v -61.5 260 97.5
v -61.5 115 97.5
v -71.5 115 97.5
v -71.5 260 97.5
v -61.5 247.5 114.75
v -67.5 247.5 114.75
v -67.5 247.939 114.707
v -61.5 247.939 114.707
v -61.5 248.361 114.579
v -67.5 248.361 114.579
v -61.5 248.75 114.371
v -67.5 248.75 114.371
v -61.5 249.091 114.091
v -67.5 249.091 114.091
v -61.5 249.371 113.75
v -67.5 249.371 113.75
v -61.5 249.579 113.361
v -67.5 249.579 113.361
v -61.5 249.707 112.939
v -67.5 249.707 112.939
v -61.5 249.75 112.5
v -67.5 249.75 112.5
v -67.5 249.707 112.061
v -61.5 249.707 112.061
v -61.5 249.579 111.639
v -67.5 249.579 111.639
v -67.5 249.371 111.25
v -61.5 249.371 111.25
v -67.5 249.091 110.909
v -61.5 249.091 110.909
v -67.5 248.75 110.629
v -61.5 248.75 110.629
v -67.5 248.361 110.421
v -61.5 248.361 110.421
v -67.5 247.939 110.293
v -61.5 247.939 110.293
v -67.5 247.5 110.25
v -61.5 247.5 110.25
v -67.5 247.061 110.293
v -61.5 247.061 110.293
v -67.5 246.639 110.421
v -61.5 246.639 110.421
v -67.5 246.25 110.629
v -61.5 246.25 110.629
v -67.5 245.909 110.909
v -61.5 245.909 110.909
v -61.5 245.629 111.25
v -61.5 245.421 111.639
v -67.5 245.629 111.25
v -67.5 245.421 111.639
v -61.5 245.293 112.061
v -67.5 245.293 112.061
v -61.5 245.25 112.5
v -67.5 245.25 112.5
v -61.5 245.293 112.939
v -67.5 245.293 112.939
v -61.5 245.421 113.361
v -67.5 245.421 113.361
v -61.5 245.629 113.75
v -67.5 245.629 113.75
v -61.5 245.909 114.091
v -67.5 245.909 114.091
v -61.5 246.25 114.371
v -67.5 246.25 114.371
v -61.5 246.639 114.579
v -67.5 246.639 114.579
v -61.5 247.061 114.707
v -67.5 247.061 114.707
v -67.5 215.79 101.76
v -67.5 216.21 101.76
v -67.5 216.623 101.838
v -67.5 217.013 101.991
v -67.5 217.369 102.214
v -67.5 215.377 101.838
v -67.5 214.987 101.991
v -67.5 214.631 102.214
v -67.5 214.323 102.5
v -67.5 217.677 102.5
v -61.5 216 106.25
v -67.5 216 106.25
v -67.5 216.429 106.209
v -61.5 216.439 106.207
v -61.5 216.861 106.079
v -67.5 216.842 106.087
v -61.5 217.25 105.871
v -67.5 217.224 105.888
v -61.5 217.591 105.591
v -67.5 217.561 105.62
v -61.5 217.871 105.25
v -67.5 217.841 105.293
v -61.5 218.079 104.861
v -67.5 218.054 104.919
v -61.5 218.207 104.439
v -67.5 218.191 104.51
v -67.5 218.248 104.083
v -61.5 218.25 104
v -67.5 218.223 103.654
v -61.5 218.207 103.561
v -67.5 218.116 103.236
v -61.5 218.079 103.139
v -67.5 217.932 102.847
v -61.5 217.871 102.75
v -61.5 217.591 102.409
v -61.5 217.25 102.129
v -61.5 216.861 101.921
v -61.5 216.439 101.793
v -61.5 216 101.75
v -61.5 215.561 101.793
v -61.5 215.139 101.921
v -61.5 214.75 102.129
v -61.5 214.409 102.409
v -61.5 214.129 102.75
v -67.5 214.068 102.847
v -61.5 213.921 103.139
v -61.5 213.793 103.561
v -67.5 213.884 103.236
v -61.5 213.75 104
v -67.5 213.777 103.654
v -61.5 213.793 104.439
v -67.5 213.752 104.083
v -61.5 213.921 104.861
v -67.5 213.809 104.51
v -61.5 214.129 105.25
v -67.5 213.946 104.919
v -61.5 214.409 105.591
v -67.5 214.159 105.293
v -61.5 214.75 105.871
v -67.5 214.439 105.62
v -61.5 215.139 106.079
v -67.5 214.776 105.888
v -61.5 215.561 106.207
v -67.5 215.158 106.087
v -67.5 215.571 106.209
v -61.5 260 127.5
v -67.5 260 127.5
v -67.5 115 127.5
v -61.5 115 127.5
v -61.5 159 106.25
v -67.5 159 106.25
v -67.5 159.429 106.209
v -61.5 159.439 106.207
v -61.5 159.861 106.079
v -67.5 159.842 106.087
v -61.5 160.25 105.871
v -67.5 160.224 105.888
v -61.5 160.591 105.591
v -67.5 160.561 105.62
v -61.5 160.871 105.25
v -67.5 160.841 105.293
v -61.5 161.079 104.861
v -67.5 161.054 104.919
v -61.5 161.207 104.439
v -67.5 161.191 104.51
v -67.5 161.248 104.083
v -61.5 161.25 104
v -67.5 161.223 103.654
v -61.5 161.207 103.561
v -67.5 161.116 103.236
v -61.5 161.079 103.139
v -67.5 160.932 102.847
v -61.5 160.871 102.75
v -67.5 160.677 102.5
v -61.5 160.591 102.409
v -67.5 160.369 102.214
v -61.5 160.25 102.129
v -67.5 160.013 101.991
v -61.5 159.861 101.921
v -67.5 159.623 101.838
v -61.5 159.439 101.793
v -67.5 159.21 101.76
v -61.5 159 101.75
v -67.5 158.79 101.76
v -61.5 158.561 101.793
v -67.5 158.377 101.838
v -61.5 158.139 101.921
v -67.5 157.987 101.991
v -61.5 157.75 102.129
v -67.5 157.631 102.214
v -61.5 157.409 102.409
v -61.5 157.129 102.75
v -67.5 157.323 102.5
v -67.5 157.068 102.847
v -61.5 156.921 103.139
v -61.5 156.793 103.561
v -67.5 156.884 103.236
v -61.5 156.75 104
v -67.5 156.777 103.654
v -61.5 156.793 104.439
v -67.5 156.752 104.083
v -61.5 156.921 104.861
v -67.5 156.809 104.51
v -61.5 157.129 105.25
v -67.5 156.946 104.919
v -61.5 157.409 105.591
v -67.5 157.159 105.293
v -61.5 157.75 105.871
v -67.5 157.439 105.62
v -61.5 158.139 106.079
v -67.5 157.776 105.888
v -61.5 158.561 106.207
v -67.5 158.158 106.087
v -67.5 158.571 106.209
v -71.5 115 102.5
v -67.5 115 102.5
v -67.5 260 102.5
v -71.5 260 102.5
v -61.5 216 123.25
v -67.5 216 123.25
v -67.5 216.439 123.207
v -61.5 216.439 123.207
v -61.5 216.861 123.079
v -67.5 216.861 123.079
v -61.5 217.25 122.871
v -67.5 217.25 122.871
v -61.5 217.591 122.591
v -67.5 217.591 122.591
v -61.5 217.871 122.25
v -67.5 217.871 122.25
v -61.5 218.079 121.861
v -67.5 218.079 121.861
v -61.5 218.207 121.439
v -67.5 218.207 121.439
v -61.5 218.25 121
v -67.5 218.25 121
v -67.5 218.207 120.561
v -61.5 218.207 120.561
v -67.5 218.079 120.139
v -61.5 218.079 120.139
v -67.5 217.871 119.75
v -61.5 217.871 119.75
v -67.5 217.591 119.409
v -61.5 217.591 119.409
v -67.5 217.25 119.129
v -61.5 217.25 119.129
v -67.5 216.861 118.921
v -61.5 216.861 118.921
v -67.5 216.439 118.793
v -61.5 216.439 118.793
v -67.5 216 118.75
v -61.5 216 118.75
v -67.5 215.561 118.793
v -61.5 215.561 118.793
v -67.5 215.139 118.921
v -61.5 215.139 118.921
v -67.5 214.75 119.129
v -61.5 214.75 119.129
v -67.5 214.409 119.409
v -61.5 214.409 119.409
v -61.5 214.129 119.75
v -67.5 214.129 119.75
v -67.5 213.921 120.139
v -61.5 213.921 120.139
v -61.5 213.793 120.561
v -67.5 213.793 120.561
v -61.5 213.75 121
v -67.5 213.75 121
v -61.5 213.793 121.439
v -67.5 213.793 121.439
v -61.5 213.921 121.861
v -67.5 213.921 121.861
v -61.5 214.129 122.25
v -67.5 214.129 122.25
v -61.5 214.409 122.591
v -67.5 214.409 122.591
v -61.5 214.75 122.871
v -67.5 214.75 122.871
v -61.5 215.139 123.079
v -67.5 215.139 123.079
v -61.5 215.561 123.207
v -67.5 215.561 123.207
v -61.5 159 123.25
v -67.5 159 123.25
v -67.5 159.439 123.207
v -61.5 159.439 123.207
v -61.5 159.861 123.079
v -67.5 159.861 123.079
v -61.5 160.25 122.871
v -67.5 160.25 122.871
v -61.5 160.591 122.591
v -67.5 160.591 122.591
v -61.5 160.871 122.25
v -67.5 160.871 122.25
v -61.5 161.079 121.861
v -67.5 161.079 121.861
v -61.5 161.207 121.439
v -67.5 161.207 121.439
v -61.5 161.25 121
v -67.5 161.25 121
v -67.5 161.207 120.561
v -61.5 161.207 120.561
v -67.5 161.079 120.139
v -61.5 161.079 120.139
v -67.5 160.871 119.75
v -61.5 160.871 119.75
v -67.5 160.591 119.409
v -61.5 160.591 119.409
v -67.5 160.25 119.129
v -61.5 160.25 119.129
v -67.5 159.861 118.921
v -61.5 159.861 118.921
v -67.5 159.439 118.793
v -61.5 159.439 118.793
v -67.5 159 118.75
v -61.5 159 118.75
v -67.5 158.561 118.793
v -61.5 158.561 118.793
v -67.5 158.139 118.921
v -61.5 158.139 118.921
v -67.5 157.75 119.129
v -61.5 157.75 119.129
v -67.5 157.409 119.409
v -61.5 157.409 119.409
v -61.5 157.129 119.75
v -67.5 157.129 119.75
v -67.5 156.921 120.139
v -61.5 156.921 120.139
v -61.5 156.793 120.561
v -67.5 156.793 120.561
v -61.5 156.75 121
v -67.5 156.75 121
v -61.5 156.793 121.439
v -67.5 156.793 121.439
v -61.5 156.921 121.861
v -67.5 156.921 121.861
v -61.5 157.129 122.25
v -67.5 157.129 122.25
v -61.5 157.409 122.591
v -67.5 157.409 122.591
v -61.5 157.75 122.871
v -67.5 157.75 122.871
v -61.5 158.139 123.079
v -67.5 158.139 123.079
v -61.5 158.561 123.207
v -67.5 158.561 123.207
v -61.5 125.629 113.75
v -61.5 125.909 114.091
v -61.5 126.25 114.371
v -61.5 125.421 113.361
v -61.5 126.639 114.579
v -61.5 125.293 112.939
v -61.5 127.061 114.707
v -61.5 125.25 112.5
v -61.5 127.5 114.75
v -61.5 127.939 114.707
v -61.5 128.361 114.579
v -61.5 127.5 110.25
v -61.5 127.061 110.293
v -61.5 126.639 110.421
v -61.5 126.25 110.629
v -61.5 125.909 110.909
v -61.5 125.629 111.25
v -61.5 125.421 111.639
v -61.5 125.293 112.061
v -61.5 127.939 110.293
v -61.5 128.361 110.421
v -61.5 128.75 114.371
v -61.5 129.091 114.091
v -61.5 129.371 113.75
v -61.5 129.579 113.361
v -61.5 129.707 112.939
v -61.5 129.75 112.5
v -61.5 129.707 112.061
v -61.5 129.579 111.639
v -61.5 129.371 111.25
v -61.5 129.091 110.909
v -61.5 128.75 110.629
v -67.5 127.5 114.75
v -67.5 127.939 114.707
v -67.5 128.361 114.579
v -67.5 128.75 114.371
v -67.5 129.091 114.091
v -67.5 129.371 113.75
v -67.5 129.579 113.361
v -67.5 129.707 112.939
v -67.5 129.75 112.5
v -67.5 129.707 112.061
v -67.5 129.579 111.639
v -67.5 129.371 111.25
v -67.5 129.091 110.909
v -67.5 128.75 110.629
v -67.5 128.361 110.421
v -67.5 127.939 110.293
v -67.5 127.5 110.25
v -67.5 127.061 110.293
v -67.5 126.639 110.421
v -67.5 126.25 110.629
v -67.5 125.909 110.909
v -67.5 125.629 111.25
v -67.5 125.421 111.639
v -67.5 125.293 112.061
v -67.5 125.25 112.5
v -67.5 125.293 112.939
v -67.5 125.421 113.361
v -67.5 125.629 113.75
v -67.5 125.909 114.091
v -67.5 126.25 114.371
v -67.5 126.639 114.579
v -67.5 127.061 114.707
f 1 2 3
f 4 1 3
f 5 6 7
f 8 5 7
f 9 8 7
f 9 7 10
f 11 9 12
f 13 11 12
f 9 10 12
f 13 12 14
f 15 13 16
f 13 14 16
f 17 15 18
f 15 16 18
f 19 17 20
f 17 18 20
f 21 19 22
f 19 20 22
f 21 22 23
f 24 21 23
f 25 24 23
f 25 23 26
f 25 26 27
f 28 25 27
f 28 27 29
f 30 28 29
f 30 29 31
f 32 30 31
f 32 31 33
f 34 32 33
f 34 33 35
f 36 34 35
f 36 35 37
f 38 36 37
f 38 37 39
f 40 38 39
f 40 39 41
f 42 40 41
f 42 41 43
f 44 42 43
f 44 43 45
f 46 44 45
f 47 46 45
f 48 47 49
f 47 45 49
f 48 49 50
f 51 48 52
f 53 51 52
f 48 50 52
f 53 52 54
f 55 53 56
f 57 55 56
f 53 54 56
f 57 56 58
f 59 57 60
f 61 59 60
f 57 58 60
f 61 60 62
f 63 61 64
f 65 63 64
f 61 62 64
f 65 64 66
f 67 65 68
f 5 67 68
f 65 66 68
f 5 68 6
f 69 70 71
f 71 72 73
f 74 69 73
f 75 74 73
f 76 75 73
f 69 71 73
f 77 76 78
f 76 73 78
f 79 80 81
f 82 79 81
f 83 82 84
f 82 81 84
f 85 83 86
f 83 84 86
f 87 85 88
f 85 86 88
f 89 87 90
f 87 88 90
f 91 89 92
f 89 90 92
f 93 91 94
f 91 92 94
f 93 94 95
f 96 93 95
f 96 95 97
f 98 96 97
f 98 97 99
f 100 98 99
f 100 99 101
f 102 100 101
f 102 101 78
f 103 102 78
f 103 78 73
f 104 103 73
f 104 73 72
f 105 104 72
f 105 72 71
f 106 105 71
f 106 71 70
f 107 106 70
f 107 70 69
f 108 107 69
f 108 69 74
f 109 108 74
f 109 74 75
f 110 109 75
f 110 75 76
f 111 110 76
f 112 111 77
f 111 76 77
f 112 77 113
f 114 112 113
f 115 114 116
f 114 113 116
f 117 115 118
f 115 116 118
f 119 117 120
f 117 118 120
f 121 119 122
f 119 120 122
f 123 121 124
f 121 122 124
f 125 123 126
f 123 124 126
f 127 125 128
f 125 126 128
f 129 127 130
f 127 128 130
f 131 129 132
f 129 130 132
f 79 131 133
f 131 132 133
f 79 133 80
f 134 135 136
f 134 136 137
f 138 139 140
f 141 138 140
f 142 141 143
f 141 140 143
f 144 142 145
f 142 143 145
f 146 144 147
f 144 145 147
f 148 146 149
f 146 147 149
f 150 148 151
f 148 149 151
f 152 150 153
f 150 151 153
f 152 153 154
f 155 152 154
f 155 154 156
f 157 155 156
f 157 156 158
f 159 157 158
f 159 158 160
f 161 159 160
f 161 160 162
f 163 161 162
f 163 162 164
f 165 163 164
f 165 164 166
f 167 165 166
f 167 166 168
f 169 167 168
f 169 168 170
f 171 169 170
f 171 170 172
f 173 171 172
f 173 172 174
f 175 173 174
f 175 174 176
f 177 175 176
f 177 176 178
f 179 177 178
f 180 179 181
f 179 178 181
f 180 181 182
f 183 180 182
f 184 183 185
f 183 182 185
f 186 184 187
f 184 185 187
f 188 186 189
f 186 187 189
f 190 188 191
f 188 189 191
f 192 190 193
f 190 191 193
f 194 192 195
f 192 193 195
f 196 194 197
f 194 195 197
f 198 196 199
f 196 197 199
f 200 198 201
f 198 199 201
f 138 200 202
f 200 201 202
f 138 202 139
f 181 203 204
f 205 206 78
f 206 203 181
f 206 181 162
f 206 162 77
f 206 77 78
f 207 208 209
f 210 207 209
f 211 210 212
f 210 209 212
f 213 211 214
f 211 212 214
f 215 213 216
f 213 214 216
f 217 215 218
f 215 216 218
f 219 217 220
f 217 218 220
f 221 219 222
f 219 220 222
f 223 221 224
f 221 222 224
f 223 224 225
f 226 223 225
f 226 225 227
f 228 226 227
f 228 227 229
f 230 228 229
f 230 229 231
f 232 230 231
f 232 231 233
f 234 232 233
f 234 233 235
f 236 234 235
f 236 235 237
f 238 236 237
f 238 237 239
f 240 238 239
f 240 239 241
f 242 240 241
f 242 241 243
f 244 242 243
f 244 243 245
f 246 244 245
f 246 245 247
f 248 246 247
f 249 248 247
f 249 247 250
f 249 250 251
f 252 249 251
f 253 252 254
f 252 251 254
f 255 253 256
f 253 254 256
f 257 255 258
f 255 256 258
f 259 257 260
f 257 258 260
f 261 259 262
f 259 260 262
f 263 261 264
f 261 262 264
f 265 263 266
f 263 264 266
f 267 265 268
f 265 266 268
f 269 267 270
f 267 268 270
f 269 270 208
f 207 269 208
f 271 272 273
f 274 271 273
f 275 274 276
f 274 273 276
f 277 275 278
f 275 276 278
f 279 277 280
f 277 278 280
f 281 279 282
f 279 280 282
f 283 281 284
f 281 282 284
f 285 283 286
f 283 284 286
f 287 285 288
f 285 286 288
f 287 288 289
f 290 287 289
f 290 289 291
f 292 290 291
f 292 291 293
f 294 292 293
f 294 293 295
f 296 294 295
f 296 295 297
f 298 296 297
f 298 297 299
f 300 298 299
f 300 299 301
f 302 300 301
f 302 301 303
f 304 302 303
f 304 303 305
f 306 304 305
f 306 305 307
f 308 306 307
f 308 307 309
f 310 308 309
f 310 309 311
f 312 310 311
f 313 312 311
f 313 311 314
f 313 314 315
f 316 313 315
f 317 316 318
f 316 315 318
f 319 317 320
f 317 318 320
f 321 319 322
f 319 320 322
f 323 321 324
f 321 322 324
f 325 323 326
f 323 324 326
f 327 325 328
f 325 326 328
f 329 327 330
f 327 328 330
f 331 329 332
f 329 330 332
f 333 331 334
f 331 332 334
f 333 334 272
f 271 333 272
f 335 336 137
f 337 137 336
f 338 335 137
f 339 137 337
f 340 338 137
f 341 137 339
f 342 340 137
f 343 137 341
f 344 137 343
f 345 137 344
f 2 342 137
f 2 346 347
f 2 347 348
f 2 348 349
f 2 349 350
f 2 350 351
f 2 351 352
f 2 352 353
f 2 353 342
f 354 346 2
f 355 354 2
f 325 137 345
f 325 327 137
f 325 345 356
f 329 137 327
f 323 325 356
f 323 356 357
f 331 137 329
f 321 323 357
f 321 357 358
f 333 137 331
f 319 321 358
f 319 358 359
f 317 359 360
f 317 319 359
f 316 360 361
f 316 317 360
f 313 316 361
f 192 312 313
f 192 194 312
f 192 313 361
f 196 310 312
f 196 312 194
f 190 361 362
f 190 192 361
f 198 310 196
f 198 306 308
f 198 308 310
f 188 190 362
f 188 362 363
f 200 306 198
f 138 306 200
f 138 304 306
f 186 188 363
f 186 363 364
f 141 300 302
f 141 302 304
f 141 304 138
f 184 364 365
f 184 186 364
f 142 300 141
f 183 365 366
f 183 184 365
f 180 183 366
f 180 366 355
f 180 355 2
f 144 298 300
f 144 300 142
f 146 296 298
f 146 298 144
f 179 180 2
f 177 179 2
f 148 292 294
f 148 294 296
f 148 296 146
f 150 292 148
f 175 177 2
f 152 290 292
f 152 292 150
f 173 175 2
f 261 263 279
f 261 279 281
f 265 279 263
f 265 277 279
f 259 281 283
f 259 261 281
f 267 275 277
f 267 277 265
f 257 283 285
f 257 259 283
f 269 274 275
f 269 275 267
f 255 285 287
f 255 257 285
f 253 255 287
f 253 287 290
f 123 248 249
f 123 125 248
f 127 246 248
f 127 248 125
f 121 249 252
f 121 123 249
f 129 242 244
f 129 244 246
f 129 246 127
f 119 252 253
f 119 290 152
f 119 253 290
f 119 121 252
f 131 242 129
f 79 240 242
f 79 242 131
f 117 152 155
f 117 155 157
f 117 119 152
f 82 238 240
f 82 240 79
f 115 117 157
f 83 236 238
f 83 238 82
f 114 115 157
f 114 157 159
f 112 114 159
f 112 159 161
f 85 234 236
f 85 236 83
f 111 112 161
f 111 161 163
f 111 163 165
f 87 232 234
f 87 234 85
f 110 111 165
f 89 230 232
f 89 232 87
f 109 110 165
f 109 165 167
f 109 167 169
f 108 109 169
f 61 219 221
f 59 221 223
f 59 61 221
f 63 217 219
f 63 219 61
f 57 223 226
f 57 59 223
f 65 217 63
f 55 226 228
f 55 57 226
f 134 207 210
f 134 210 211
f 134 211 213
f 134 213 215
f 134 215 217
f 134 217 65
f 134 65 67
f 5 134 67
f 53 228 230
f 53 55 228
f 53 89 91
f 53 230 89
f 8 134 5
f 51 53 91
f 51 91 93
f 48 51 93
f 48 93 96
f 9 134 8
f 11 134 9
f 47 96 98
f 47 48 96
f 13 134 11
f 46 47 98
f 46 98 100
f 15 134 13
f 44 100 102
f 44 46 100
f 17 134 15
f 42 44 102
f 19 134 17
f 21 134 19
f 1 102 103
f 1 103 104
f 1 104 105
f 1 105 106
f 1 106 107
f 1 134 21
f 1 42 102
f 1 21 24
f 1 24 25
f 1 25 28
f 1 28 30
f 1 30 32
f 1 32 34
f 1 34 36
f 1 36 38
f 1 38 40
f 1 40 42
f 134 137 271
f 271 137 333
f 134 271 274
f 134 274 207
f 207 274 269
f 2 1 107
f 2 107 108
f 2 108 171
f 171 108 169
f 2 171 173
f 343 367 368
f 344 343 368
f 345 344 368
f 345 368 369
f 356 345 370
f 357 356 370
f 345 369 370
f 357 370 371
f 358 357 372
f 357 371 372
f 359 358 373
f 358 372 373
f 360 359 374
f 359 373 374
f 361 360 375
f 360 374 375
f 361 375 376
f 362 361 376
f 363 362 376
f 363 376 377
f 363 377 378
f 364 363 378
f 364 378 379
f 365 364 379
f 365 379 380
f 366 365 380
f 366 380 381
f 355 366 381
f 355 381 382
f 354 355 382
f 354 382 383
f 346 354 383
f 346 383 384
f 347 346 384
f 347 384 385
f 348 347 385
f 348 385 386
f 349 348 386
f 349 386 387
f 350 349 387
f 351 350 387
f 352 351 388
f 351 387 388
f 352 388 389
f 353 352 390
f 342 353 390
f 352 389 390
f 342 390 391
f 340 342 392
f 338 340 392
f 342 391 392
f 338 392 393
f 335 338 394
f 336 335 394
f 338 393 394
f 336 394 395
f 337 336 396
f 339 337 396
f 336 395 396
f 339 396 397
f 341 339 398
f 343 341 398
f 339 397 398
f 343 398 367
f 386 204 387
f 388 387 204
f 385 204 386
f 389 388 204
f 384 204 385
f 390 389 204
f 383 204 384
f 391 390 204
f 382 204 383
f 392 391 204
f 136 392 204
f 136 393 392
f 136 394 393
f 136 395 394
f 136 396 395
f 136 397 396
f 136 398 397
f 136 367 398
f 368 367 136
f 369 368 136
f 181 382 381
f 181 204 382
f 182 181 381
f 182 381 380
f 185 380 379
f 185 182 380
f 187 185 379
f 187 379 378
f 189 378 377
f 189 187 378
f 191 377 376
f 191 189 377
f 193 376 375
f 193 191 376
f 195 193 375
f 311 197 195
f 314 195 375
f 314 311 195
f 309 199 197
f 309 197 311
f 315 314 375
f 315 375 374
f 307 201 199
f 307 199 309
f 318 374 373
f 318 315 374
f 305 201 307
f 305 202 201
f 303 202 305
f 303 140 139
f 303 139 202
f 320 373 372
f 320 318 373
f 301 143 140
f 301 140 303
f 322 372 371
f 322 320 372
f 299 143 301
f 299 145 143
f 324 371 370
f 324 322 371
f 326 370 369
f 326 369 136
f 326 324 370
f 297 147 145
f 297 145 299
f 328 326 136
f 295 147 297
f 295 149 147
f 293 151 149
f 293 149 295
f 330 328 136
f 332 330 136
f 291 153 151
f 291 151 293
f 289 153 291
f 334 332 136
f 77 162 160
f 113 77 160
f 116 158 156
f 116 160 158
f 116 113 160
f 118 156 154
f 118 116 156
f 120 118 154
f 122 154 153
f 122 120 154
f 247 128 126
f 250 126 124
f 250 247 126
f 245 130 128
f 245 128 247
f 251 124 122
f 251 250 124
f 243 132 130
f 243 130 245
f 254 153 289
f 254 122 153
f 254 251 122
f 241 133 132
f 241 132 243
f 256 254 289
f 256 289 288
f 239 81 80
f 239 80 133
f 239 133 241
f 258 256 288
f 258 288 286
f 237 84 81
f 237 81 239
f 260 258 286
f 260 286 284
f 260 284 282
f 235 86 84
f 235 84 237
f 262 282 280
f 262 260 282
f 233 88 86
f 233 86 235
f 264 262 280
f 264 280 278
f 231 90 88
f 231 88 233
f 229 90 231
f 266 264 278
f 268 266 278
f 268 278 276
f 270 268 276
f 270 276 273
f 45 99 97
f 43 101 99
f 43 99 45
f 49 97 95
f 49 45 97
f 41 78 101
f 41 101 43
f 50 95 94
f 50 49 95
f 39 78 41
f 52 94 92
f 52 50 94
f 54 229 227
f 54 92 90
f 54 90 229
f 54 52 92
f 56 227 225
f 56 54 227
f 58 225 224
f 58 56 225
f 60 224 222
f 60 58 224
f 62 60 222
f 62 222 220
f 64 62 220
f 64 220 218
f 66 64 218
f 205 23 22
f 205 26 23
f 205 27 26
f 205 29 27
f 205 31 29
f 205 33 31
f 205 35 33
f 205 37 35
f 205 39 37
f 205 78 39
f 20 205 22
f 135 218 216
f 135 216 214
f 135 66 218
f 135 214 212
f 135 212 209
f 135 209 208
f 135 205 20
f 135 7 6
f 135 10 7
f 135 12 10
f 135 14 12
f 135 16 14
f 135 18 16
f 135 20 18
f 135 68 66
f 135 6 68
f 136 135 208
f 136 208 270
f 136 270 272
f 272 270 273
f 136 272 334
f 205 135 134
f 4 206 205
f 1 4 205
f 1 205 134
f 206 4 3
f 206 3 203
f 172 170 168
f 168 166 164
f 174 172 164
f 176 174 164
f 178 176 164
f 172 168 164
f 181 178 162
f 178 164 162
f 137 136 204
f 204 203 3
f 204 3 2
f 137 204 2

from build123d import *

# Parameters (mm, degrees)
BOSS_EXTRUDE1_DEPTH  = 145
M4_CLEARANCE_HOLE1_D = 4.5
HOLE1_D              = 4.5
HOLE1_DEPTH          = 6
SKETCH8_W            = 5
SKETCH8_H            = 145
CUT_EXTRUDE1_DEPTH   = 4


with BuildPart() as part:
    # Sketch1 → Boss-Extrude1 (new body)
    with BuildSketch(Plane(origin=(0, 260, 0), x_dir=(-1, 0, 0), z_dir=(0, -1, 0))):
        Polygon((71.5, -127.5), (61.5, -127.5), (61.5, -97.5), (71.5, -97.5), (71.5, -102.5), (67.5, -102.5), (67.5, -122.5), (71.5, -122.5), align=None)
    extrude(amount=BOSS_EXTRUDE1_DEPTH)

    # M4 Clearance Hole1 (through all)
    with Locations(Plane(origin=(-61.5, 0, 0), x_dir=(0, 0, -1), z_dir=(1, 0, 0))):
        with Locations((-112.5, 247.5), (-112.5, 127.5)):
            Hole(M4_CLEARANCE_HOLE1_D / 2)

    # Hole1
    with Locations(Plane(origin=(-61.5, 0, 0), x_dir=(0, 0, -1), z_dir=(1, 0, 0))):
        with Locations((-104, 216), (-121, 216), (-104, 159), (-121, 159)):
            Hole(HOLE1_D / 2, depth=HOLE1_DEPTH)

    # Sketch8 → Cut-Extrude1 (cut)
    with BuildSketch(Plane.ZY.offset(71.5)):
        with Locations((125, 187.5)):
            Rectangle(SKETCH8_W, SKETCH8_H)
    extrude(amount=-CUT_EXTRUDE1_DEPTH, mode=Mode.SUBTRACT)


solid = part.part
